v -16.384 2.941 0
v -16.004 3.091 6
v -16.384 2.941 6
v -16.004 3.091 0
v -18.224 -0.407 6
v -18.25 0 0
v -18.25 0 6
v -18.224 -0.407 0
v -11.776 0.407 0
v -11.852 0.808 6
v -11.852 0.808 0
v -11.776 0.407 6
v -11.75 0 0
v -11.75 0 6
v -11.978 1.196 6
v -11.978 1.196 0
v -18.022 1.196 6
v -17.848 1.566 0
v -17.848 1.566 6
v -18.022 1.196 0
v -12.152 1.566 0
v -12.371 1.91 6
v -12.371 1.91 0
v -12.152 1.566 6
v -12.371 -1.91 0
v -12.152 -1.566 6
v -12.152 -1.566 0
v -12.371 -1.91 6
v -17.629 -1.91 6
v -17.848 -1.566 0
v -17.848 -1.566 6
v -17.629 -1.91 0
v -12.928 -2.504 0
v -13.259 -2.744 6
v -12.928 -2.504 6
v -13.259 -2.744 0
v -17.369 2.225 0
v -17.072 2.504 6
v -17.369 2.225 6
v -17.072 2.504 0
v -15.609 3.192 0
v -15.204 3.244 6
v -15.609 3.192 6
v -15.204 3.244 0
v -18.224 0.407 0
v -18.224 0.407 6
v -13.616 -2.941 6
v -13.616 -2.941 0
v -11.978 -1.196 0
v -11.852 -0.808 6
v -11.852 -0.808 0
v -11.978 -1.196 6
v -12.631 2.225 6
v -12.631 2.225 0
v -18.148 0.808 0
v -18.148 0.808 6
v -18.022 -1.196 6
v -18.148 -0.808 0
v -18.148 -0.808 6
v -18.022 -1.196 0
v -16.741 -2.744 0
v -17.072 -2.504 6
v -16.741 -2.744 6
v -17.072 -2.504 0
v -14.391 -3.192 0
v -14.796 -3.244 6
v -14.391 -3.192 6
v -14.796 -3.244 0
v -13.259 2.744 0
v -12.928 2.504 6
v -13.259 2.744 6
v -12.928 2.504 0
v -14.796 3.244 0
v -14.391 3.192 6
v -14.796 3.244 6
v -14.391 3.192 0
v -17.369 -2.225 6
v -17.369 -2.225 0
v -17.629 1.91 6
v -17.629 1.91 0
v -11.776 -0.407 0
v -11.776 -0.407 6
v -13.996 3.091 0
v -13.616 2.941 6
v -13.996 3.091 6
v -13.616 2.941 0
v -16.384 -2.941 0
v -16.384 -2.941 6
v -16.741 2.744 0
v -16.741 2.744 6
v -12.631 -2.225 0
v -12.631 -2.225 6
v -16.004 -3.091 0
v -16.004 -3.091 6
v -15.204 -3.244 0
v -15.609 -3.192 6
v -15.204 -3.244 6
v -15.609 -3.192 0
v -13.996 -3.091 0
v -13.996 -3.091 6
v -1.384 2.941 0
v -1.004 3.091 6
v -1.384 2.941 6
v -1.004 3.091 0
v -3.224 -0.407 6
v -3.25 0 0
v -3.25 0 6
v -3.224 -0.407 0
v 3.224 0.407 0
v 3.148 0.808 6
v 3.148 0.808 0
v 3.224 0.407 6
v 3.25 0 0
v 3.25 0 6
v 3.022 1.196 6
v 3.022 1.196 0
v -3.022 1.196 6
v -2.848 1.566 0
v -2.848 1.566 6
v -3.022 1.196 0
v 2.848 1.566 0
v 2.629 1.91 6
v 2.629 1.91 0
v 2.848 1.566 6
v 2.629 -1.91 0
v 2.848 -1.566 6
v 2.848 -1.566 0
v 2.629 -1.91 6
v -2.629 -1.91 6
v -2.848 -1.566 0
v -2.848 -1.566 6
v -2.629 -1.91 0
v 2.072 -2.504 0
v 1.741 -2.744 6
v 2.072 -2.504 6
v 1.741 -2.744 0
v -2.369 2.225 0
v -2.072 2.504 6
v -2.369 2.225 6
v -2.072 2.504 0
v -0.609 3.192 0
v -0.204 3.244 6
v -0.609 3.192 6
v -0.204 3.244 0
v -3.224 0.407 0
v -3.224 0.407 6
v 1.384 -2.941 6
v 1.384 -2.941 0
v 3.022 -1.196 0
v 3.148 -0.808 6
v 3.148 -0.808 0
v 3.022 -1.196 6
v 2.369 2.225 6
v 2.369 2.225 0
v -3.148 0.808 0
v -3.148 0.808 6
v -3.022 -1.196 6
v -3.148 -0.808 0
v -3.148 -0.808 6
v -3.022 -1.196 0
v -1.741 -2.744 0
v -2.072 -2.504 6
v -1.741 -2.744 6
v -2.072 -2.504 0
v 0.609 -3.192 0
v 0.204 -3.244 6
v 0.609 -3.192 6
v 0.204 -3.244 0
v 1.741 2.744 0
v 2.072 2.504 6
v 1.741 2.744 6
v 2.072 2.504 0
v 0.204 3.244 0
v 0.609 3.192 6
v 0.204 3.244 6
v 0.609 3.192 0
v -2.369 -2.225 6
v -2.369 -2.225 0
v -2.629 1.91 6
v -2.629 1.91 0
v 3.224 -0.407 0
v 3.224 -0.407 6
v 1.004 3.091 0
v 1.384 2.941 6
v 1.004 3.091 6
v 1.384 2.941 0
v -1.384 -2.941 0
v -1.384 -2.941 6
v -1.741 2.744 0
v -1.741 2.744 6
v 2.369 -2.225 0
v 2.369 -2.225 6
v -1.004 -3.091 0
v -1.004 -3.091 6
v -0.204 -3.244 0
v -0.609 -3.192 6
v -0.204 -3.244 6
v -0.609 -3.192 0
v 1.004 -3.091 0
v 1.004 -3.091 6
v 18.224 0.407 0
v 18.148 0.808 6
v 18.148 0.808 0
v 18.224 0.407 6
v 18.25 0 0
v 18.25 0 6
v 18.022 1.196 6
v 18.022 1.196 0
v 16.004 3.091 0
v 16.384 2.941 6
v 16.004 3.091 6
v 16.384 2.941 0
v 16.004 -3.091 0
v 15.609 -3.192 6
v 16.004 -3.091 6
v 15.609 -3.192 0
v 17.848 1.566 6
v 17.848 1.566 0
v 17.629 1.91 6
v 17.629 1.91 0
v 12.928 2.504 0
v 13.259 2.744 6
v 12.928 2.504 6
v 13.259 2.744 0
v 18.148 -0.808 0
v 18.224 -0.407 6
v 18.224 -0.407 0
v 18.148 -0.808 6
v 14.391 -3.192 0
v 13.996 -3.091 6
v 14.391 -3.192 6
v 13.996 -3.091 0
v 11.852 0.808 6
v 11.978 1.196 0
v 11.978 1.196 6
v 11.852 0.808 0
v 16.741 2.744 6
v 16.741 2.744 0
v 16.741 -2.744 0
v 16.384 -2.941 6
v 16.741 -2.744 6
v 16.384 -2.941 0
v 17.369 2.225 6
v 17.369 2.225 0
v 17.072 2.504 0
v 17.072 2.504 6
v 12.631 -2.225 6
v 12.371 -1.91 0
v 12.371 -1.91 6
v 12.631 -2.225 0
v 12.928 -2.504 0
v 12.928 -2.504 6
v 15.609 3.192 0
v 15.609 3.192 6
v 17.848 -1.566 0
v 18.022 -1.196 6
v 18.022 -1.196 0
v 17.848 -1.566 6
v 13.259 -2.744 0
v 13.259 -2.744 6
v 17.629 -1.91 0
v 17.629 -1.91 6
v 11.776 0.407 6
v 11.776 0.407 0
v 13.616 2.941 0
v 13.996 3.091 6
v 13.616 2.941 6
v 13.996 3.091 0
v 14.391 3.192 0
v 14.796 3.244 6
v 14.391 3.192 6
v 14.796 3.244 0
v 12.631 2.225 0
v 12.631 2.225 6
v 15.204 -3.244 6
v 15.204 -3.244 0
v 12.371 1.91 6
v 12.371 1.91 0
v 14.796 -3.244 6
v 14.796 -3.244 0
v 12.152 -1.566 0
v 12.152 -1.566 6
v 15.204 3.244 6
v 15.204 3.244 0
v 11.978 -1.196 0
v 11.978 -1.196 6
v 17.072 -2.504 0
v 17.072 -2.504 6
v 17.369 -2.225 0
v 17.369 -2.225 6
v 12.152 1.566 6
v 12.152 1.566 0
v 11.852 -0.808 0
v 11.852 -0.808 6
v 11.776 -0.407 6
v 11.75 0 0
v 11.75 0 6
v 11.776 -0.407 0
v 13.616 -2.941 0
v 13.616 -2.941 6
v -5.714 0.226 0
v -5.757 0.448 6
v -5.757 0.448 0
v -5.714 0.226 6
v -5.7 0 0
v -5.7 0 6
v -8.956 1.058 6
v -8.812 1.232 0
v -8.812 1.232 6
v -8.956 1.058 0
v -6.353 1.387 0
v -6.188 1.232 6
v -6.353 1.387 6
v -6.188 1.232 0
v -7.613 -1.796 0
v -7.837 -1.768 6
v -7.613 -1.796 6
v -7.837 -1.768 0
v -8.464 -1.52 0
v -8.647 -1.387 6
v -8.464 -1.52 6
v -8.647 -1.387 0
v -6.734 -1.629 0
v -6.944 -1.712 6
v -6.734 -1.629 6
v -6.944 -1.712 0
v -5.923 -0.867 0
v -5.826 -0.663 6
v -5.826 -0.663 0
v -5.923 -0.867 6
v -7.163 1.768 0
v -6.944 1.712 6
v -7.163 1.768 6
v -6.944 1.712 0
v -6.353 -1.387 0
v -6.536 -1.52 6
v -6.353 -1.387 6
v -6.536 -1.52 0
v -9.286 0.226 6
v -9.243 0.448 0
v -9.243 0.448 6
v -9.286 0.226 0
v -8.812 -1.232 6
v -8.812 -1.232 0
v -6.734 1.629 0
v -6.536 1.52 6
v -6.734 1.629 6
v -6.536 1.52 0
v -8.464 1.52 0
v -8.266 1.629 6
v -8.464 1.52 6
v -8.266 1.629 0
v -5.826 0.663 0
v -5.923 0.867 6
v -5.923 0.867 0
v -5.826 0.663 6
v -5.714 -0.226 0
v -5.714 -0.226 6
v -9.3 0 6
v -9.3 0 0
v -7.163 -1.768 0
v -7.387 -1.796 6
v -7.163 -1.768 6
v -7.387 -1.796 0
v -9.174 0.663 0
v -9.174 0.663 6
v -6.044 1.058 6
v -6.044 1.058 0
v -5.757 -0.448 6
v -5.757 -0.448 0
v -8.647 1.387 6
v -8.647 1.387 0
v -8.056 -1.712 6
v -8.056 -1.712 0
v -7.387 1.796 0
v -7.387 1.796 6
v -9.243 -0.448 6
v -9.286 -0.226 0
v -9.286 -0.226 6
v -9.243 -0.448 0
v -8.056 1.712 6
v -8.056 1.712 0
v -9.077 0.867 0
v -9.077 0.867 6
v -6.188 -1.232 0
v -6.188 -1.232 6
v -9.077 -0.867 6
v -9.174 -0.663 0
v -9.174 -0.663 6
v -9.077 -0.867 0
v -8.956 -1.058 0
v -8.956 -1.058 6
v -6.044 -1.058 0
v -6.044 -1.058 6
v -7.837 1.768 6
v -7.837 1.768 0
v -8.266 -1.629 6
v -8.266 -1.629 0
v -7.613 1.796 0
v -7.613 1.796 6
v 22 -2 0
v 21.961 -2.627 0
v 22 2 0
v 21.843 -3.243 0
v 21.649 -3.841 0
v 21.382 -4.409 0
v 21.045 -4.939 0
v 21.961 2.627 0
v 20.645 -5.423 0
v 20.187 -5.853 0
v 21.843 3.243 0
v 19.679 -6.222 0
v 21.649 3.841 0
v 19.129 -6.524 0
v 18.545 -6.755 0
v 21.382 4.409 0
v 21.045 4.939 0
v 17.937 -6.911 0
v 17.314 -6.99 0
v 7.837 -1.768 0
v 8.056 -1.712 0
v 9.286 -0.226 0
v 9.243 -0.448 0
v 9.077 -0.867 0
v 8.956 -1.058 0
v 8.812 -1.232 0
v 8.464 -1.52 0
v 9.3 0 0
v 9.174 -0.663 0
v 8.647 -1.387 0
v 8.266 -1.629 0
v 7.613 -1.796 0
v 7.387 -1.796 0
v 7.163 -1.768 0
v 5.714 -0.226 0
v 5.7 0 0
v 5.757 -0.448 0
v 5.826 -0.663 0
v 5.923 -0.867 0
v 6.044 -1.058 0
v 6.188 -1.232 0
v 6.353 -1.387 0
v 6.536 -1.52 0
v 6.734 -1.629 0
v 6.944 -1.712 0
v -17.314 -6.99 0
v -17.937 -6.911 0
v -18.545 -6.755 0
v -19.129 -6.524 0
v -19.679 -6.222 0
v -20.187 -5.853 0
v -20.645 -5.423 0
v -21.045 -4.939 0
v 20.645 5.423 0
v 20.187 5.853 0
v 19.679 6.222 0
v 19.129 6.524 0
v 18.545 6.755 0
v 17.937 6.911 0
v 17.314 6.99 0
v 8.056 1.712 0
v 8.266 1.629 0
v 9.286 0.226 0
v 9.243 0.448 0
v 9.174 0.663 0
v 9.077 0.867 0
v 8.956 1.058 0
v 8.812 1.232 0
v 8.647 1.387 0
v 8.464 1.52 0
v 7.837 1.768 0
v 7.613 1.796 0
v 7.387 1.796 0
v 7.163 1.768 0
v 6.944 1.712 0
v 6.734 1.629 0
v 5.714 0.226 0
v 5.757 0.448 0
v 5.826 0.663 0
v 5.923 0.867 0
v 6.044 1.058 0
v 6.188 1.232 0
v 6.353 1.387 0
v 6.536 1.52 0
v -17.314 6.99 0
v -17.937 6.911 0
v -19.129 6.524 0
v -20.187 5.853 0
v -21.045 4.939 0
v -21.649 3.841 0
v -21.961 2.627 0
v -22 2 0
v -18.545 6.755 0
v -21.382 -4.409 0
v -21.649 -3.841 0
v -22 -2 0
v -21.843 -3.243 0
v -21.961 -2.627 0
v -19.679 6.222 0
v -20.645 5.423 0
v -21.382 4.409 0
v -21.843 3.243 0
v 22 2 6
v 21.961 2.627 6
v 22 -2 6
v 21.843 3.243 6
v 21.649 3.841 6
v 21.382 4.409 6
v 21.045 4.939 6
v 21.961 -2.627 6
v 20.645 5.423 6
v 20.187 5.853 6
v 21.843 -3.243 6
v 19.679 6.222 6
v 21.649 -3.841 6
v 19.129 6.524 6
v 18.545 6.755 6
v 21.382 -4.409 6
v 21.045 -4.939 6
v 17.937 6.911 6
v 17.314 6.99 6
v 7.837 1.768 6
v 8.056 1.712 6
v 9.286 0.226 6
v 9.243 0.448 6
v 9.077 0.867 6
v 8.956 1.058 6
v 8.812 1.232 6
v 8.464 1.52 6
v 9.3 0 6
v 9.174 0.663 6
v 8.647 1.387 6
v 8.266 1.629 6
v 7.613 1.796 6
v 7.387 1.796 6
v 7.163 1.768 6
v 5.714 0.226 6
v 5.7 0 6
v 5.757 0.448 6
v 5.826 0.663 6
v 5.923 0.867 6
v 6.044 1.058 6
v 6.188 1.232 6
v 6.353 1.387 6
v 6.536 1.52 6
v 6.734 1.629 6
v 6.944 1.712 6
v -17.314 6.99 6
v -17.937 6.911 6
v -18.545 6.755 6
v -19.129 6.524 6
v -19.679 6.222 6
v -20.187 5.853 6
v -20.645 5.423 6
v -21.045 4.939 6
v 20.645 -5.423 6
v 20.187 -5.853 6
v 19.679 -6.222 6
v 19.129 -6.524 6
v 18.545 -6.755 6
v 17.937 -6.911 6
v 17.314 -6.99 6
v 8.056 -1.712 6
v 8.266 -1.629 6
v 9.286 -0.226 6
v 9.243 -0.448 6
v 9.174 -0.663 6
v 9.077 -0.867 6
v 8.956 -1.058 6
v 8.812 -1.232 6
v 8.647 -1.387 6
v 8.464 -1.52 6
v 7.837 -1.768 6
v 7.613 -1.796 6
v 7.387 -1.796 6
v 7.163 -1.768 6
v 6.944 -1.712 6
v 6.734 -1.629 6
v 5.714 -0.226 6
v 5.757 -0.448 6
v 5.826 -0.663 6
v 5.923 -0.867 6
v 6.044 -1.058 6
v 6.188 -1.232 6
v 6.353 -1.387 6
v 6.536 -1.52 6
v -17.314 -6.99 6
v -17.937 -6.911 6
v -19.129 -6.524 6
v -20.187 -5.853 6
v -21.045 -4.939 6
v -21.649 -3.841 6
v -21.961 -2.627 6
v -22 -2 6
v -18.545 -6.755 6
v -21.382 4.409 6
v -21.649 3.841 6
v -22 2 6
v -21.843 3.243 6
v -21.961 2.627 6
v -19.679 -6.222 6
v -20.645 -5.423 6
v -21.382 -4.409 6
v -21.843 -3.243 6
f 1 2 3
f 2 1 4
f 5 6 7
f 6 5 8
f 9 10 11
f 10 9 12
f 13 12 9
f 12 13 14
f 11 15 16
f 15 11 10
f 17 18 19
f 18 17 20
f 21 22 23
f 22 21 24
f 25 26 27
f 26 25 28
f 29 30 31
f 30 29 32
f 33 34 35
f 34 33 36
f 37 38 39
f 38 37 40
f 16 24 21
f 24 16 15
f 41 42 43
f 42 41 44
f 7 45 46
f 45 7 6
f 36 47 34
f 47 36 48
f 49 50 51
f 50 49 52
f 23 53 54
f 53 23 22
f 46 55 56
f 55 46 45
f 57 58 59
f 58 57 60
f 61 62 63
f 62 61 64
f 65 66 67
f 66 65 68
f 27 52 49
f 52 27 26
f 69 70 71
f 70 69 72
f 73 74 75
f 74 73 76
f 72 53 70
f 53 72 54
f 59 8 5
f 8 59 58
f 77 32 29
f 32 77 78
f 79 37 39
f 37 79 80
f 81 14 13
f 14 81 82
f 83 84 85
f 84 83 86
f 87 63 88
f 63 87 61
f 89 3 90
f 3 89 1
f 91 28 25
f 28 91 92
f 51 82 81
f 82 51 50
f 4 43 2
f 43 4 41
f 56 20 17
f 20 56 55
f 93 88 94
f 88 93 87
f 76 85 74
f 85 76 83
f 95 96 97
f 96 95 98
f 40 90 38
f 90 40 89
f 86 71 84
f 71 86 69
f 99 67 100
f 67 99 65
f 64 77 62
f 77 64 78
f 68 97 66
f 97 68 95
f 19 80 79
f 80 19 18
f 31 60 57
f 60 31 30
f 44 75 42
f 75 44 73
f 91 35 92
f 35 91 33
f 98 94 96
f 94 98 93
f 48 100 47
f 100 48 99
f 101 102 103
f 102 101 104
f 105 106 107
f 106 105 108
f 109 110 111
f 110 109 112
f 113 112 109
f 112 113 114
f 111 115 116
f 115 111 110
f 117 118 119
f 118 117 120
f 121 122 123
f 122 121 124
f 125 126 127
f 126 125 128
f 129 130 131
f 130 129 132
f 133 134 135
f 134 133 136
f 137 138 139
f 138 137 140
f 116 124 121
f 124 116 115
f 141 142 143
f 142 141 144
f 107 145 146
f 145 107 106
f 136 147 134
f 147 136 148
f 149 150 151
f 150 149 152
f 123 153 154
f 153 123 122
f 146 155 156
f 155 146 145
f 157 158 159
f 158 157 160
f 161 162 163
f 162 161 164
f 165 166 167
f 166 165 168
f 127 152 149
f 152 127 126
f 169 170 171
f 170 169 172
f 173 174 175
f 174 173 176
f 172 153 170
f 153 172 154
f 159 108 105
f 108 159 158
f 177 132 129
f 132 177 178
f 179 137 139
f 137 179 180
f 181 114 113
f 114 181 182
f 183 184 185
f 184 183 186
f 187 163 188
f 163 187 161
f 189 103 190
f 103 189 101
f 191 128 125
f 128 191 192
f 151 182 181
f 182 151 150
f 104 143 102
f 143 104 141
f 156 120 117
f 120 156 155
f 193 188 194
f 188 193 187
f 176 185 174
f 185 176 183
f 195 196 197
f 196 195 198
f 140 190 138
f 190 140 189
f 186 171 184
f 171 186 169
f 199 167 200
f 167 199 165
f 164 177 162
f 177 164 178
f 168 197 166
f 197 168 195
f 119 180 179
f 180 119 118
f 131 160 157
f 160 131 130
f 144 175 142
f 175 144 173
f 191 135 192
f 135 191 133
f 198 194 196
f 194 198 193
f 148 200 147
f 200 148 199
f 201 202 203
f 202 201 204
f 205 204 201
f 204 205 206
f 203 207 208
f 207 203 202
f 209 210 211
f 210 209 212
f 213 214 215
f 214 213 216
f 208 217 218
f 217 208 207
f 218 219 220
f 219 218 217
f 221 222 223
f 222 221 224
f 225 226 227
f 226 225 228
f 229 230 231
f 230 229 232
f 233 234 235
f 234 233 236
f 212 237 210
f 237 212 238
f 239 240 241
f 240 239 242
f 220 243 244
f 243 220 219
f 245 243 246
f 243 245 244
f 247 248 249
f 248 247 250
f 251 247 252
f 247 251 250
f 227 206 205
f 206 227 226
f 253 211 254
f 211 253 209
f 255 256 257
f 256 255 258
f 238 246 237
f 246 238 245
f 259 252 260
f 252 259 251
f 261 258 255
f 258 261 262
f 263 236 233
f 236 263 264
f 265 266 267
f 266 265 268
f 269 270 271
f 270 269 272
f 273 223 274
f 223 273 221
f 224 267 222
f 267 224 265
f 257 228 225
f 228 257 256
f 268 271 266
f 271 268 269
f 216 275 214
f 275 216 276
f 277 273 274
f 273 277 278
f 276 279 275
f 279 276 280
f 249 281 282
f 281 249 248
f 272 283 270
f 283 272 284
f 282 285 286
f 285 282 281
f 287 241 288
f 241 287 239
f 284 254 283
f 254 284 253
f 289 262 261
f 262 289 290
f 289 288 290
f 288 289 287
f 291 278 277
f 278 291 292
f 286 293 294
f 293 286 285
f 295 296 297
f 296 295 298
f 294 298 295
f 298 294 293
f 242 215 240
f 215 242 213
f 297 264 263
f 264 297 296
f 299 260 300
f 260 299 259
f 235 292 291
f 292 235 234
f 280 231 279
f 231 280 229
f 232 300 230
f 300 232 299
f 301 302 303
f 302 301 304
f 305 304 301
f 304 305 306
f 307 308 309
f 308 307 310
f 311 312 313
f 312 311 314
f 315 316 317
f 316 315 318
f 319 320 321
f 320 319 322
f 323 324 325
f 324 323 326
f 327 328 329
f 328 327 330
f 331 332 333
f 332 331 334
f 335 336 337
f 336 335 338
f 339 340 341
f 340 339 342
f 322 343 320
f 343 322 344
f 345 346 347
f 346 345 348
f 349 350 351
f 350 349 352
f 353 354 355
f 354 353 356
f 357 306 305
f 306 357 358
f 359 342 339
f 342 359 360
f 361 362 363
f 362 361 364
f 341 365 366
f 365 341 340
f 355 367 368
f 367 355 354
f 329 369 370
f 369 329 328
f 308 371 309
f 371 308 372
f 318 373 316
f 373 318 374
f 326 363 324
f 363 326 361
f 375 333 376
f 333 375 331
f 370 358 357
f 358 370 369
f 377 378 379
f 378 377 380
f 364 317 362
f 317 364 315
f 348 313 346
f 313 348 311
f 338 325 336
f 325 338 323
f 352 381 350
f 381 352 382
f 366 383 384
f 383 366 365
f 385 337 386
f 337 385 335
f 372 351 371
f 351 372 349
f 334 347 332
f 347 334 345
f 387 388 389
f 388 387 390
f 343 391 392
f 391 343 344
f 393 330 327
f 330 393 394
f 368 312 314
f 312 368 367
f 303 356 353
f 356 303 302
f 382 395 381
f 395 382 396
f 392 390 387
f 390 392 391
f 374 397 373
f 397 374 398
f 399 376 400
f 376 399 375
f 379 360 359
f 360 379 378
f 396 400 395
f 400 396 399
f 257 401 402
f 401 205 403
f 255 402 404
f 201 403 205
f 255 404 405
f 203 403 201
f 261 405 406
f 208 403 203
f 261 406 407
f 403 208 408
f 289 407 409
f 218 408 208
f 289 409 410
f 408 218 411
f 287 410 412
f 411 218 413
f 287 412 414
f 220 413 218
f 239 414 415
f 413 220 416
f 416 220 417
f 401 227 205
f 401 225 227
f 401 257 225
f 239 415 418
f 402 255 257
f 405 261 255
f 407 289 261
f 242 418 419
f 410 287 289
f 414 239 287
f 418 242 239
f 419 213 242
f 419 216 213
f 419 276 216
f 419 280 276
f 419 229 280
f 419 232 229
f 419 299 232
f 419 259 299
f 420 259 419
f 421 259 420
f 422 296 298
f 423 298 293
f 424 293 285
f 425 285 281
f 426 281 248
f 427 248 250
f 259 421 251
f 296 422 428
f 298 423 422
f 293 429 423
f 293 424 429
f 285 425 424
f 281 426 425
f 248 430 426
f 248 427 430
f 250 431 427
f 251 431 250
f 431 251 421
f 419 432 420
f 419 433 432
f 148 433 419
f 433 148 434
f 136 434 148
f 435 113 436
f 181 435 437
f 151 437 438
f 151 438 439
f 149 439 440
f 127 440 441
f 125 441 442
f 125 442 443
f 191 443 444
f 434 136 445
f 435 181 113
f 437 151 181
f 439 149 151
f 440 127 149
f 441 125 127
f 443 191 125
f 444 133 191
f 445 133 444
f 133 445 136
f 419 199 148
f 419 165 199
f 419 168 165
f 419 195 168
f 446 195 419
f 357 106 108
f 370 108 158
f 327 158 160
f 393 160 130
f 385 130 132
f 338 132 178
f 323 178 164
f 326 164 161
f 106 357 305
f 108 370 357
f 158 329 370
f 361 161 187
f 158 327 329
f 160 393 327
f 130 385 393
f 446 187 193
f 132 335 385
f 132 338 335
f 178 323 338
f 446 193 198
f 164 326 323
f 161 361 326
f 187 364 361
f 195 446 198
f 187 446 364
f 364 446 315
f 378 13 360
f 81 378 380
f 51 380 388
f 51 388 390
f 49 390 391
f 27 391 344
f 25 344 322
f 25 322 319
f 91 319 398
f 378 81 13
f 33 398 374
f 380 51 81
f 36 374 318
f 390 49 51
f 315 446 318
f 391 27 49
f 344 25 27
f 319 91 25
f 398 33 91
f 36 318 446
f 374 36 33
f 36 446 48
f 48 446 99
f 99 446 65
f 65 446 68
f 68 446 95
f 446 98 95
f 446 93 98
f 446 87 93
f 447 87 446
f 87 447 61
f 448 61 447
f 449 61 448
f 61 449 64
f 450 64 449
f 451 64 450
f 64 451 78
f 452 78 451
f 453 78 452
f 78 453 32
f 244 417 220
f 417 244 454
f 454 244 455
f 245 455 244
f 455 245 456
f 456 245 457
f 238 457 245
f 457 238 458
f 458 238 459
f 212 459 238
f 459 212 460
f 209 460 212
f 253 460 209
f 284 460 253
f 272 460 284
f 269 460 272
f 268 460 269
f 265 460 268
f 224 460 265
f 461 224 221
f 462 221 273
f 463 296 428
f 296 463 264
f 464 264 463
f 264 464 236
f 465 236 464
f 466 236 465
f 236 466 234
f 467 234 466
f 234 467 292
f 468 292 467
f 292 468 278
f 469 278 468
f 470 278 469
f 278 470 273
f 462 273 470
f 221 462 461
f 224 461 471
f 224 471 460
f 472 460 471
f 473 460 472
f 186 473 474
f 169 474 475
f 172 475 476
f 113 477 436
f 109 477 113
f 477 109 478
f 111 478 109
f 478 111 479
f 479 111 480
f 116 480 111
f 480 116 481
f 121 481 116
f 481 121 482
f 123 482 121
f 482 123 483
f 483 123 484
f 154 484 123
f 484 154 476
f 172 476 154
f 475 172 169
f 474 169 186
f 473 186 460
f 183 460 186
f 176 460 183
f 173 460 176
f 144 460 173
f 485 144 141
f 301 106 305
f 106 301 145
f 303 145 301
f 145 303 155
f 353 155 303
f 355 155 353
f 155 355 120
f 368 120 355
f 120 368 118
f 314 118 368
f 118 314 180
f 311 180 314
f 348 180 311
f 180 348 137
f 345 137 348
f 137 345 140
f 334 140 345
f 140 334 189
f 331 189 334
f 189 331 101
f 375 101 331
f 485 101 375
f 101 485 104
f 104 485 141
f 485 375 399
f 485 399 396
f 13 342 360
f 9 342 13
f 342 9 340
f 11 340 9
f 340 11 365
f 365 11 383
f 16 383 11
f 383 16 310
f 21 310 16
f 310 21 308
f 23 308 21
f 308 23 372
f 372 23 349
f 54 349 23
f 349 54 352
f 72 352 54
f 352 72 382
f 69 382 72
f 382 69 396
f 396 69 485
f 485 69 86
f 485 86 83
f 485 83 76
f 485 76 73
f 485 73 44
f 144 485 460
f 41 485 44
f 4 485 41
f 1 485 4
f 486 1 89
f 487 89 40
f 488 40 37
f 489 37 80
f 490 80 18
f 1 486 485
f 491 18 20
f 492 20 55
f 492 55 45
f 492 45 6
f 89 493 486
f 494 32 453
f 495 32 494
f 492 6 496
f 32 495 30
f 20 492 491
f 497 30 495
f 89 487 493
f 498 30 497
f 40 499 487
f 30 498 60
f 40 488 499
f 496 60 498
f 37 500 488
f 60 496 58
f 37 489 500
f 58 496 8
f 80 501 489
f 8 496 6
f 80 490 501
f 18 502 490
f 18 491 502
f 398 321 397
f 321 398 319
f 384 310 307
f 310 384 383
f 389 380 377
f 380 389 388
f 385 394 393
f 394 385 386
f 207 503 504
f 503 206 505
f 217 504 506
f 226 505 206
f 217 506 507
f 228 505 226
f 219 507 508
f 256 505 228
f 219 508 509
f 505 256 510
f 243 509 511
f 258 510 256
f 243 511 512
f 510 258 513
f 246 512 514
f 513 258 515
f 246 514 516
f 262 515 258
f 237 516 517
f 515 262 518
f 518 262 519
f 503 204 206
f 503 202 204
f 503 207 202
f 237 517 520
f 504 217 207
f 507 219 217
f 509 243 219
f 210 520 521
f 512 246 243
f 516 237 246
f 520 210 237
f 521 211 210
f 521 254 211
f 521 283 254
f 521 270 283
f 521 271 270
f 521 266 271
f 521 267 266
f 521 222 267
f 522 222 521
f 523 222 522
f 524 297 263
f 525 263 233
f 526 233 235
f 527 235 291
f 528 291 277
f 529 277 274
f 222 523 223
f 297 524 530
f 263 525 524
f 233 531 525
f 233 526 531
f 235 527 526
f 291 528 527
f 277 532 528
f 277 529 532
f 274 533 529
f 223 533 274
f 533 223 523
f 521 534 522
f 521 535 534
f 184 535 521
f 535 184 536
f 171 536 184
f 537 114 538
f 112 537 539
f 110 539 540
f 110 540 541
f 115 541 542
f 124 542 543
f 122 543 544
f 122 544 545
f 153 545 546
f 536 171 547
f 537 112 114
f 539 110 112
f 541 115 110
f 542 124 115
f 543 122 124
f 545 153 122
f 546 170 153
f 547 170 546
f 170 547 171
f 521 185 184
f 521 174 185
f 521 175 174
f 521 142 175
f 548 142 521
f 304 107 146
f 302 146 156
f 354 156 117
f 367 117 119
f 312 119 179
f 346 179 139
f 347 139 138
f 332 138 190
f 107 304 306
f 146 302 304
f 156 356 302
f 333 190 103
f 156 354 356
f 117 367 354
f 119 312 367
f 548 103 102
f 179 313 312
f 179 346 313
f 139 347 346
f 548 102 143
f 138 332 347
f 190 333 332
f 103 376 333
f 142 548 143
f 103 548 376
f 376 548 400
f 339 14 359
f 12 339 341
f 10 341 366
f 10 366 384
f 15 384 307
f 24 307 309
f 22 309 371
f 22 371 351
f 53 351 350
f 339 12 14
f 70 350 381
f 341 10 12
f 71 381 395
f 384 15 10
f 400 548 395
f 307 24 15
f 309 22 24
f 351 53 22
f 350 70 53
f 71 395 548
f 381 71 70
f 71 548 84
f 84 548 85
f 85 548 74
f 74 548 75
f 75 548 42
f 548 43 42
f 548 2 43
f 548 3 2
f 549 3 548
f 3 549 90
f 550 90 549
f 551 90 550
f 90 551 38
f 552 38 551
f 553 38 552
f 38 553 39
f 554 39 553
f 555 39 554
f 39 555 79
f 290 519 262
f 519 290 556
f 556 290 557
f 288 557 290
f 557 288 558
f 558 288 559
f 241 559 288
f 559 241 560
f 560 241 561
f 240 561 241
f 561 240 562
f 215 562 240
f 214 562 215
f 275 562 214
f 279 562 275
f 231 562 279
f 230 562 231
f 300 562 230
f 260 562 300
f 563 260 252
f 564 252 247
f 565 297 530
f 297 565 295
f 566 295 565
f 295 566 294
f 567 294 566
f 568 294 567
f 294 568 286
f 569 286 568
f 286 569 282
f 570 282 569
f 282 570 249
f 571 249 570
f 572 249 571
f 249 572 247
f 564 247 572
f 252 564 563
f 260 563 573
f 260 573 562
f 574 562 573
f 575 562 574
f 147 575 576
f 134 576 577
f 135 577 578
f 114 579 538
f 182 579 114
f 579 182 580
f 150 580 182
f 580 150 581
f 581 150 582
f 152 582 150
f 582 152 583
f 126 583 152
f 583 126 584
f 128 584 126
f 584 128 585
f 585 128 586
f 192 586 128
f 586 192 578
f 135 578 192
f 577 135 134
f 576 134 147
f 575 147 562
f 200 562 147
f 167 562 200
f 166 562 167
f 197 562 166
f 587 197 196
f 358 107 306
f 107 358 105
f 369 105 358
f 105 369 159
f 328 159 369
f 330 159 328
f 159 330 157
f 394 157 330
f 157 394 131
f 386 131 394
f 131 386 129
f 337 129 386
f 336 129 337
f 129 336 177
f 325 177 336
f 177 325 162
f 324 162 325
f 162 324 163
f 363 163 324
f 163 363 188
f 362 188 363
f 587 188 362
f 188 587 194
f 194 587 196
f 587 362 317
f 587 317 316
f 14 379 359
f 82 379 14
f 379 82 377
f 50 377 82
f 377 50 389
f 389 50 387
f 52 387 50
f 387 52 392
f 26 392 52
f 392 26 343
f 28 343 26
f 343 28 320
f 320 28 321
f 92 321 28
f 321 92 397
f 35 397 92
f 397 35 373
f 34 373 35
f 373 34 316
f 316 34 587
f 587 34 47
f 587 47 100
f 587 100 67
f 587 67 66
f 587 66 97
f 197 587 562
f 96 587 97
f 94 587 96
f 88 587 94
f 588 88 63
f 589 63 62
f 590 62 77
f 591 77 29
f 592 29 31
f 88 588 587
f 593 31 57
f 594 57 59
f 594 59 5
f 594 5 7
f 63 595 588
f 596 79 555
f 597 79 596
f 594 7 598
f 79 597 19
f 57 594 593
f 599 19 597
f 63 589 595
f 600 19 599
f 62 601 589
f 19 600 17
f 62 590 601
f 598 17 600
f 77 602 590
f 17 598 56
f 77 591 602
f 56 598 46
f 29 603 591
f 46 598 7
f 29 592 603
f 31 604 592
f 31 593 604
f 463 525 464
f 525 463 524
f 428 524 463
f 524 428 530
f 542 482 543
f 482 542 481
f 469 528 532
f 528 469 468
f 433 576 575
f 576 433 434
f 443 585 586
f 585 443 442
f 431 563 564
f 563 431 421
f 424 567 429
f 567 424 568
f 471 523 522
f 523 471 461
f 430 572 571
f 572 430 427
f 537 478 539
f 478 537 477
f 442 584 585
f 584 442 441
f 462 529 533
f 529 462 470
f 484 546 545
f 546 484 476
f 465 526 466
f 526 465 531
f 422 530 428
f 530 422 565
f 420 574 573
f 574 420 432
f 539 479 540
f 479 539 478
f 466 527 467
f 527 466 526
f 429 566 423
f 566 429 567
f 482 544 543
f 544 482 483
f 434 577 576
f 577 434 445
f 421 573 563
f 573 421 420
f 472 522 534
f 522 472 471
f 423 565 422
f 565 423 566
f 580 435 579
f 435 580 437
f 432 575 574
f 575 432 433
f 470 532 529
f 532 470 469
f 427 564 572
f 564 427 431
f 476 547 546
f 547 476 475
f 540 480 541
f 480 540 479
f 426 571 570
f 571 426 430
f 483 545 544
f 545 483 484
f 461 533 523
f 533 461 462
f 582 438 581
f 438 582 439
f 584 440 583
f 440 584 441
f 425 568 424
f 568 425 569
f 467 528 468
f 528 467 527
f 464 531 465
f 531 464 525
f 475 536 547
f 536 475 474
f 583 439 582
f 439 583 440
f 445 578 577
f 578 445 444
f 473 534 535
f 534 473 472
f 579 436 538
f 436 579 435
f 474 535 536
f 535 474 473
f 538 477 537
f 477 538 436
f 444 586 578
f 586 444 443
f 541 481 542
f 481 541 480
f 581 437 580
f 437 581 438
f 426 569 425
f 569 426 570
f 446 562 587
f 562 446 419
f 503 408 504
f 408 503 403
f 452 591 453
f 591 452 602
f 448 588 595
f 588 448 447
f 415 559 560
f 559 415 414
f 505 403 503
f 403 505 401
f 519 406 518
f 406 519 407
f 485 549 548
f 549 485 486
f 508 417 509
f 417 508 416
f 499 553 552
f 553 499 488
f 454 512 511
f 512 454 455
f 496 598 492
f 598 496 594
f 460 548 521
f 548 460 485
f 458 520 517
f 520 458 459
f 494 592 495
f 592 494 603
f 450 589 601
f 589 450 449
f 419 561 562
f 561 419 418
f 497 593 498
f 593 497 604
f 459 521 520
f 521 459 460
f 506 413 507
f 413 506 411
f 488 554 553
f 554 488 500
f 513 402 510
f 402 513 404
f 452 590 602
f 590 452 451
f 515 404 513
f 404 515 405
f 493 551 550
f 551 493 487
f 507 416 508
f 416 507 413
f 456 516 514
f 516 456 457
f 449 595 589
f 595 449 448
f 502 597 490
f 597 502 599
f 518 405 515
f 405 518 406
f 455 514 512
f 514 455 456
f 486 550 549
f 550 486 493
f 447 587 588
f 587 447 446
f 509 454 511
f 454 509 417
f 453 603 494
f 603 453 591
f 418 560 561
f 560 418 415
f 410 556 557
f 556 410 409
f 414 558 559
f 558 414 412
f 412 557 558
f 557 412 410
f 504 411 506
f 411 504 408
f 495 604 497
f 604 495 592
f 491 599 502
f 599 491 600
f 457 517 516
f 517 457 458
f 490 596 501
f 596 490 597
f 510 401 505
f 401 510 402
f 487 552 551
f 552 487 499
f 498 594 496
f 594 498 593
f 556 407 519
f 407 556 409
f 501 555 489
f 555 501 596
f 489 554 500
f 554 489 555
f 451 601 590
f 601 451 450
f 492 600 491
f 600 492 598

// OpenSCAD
$fn = 50;


difference() {
	union() {
		hull() {
			translate(v = [-17.0000000000, 2.0000000000, 0]) {
				cylinder(h = 6, r = 5);
			}
			translate(v = [17.0000000000, 2.0000000000, 0]) {
				cylinder(h = 6, r = 5);
			}
			translate(v = [-17.0000000000, -2.0000000000, 0]) {
				cylinder(h = 6, r = 5);
			}
			translate(v = [17.0000000000, -2.0000000000, 0]) {
				cylinder(h = 6, r = 5);
			}
		}
	}
	union() {
		translate(v = [-15.0000000000, 0.0000000000, -100.0000000000]) {
			cylinder(h = 200, r = 3.2500000000);
		}
		translate(v = [0.0000000000, 0.0000000000, -100.0000000000]) {
			cylinder(h = 200, r = 3.2500000000);
		}
		translate(v = [15.0000000000, 0.0000000000, -100.0000000000]) {
			cylinder(h = 200, r = 3.2500000000);
		}
		translate(v = [-15.0000000000, 0.0000000000, 0]) {
			cylinder(h = 6, r = 1.8000000000);
		}
		translate(v = [-7.5000000000, 0.0000000000, 0]) {
			cylinder(h = 6, r = 1.8000000000);
		}
		cylinder(h = 6, r = 1.8000000000);
		translate(v = [7.5000000000, 0.0000000000, 0]) {
			cylinder(h = 6, r = 1.8000000000);
		}
		translate(v = [15.0000000000, 0.0000000000, 0]) {
			cylinder(h = 6, r = 1.8000000000);
		}
		translate(v = [-15.0000000000, 0.0000000000, 0]) {
			cylinder(h = 6, r = 1.8000000000);
		}
		translate(v = [-7.5000000000, 0.0000000000, 0]) {
			cylinder(h = 6, r = 1.8000000000);
		}
		cylinder(h = 6, r = 1.8000000000);
		translate(v = [7.5000000000, 0.0000000000, 0]) {
			cylinder(h = 6, r = 1.8000000000);
		}
		translate(v = [15.0000000000, 0.0000000000, 0]) {
			cylinder(h = 6, r = 1.8000000000);
		}
		translate(v = [-15.0000000000, 0.0000000000, 0]) {
			cylinder(h = 6, r = 1.8000000000);
		}
		translate(v = [-7.5000000000, 0.0000000000, 0]) {
			cylinder(h = 6, r = 1.8000000000);
		}
		cylinder(h = 6, r = 1.8000000000);
		translate(v = [7.5000000000, 0.0000000000, 0]) {
			cylinder(h = 6, r = 1.8000000000);
		}
		translate(v = [15.0000000000, 0.0000000000, 0]) {
			cylinder(h = 6, r = 1.8000000000);
		}
	}
}
